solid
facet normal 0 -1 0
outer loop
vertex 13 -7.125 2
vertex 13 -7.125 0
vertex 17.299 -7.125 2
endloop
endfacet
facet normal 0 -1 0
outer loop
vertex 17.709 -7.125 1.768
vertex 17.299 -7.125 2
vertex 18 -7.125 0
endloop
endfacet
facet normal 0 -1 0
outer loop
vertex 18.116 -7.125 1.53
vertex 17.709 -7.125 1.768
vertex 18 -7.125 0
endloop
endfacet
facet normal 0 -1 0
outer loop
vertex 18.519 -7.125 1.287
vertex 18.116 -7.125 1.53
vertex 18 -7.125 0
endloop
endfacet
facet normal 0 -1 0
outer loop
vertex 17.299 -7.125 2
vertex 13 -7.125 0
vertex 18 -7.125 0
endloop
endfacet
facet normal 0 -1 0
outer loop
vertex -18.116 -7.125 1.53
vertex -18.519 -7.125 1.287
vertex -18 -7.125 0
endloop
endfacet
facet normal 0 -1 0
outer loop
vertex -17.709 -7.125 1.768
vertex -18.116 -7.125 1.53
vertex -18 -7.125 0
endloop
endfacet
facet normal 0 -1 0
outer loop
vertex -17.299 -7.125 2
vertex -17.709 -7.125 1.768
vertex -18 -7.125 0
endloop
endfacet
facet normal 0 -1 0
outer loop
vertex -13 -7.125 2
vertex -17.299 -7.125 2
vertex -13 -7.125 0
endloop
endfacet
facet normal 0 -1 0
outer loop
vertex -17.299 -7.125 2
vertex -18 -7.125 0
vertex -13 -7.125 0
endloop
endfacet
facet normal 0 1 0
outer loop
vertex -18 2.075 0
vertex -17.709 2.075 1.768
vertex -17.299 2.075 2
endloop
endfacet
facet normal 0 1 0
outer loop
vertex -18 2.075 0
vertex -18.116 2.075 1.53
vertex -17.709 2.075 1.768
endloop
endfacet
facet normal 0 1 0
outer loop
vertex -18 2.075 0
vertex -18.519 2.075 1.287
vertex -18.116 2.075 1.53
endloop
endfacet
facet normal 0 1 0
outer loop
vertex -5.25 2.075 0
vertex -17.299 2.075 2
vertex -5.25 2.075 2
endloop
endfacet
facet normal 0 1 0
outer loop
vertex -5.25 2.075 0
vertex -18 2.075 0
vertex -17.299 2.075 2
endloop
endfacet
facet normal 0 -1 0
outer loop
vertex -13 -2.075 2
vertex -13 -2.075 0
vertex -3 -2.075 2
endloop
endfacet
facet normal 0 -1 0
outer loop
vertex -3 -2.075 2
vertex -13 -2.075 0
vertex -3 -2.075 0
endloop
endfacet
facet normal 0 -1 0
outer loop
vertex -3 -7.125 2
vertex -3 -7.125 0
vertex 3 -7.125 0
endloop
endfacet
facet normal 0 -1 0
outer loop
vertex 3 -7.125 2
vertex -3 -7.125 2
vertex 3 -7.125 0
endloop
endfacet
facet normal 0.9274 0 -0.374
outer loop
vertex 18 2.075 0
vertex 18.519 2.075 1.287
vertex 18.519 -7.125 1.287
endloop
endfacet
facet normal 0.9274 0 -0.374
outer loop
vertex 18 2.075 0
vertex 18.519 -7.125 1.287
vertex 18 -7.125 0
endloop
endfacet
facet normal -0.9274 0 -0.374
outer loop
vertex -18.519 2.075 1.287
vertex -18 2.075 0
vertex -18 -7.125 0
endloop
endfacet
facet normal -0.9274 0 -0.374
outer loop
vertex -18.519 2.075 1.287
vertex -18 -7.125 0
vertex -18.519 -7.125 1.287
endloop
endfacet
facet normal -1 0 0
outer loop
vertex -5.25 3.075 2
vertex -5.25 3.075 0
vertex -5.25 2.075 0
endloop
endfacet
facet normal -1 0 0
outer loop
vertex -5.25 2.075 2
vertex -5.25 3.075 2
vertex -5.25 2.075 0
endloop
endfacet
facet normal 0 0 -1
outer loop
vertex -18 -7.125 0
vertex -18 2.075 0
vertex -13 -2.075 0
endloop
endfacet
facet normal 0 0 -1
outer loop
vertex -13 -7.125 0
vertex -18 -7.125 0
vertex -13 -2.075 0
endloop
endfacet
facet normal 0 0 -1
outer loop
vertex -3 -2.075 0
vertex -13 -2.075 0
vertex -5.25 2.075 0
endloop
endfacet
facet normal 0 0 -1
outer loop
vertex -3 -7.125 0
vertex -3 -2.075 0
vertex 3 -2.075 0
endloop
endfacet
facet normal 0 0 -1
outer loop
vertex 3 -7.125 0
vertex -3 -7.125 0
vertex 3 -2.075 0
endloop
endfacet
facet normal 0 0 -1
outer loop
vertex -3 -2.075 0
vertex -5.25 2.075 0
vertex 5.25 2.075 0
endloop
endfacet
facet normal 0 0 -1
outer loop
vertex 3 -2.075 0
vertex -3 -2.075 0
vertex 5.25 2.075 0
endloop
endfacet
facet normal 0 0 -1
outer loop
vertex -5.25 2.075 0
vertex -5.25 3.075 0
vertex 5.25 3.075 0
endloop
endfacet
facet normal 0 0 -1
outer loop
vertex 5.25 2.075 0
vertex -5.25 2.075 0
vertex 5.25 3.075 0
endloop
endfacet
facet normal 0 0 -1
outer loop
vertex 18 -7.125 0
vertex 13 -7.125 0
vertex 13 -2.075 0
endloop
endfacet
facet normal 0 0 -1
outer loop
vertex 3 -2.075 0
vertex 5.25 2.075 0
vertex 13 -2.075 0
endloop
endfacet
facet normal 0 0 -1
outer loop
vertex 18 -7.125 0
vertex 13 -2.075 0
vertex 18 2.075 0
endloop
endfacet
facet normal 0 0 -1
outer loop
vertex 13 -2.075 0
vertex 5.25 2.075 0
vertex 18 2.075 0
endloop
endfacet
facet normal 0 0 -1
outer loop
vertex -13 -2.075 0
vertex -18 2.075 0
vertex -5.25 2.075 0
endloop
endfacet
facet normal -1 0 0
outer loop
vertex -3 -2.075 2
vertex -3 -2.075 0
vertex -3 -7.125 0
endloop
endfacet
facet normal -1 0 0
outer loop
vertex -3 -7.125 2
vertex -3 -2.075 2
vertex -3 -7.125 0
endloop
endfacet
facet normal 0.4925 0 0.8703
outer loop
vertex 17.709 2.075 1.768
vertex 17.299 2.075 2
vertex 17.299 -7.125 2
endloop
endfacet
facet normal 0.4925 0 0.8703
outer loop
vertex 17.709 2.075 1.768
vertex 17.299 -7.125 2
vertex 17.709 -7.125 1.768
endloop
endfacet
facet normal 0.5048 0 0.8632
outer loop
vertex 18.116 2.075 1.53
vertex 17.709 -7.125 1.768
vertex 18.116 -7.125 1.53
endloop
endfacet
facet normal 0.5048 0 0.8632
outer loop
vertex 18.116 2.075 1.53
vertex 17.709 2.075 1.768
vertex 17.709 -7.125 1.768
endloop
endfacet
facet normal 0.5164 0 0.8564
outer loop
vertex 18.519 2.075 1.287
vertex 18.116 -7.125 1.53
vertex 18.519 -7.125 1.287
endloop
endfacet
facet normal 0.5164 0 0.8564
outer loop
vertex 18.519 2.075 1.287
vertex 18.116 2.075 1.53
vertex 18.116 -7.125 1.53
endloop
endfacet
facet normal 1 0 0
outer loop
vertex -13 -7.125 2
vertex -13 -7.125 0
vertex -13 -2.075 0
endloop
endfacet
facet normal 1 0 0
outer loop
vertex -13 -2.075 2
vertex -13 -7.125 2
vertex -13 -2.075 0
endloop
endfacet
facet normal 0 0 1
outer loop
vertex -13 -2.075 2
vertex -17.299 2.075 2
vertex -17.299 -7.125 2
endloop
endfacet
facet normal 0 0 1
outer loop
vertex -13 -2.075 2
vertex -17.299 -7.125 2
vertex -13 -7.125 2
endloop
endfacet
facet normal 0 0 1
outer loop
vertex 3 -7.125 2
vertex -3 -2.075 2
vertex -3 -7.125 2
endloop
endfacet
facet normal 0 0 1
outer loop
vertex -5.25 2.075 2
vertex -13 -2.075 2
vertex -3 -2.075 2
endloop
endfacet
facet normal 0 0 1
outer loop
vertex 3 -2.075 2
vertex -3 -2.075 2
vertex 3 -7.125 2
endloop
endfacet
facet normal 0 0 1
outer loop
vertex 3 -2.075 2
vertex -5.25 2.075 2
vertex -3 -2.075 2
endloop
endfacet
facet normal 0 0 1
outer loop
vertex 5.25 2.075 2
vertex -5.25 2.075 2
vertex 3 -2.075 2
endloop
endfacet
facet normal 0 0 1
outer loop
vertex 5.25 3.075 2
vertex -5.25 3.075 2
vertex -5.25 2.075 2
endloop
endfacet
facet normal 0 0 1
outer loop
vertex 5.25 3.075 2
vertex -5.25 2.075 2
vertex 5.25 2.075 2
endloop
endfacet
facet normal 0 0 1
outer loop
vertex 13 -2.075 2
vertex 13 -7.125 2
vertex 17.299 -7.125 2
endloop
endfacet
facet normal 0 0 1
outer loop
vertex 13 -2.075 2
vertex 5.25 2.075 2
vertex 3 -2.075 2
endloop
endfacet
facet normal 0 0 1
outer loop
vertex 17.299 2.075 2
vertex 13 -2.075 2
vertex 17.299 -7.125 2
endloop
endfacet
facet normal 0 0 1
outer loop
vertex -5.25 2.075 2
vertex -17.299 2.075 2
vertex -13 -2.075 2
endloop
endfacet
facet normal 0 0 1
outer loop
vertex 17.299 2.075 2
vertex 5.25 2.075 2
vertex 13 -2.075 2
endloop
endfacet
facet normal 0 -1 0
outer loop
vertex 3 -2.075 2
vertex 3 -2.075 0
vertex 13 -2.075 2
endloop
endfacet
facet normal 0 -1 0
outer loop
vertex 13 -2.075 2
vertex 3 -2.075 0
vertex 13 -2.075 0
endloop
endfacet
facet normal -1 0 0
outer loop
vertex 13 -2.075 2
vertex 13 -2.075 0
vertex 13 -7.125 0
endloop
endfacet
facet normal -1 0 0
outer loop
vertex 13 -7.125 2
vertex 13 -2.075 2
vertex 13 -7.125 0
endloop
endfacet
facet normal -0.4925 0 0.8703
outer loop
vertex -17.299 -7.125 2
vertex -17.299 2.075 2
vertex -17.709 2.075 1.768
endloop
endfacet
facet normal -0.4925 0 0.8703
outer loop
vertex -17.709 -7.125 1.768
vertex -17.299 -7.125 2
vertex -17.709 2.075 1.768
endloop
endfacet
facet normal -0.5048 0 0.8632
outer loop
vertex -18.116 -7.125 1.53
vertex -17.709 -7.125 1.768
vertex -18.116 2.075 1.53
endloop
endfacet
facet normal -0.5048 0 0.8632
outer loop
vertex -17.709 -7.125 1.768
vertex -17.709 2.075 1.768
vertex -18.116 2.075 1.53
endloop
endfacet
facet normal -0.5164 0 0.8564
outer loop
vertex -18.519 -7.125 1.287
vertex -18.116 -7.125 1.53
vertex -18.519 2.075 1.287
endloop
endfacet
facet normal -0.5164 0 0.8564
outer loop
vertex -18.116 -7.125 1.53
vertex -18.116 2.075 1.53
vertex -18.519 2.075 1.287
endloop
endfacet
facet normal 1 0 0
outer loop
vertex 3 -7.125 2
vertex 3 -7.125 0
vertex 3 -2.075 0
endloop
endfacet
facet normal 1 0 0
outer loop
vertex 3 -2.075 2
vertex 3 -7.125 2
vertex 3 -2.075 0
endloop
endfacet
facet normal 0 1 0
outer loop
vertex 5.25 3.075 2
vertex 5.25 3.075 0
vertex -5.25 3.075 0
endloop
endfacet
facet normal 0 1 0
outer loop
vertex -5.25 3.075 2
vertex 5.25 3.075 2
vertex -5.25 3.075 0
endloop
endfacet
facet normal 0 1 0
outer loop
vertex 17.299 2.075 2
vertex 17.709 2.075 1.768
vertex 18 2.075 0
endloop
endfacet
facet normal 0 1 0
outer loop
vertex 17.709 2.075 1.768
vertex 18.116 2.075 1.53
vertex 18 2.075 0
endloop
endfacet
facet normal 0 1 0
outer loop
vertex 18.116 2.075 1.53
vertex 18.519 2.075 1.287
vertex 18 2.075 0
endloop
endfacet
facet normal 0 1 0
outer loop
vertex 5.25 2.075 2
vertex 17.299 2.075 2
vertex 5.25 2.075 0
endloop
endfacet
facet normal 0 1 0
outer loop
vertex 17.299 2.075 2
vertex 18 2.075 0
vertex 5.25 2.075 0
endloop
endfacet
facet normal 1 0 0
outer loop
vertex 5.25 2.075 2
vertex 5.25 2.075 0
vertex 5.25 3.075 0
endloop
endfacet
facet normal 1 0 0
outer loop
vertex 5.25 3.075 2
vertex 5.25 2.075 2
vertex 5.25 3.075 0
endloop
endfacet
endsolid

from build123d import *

# Parameters (mm, degrees)
BOSS_EXTRUDE1_DEPTH = 2
BOSS_EXTRUDE2_DEPTH = 9.2
CUT_EXTRUDE1_REACH  = 23.032


with BuildPart() as part:
    # Sketch1 → Boss-Extrude1 (new body)
    with BuildSketch(Plane.XY):
        Polygon((3, -2.075), (13, -2.075), (13, -7.125), (18, -7.125), (18, -2.075), (18, 2.075), (5.25, 2.075), (5.25, 3.075), (-5.25, 3.075), (-5.25, 2.075), (-18, 2.075), (-18, -2.075), (-18, -7.125), (-13, -7.125), (-13, -2.075), (-3, -2.075), (-3, -7.125), (3, -7.125), align=None)
    extrude(amount=BOSS_EXTRUDE1_DEPTH)

    # Sketch2 → Boss-Extrude2 (add)
    with BuildSketch(Plane(origin=(0, 2.075, 0), x_dir=(1, 0, 0), z_dir=(0, 1, 0))):
        Polygon((-18, 0), (-18.806783424, -2), (-18, -2), align=None)
        Polygon((18, 0), (18, -2), (18.806783424, -2), align=None)
    extrude(amount=-BOSS_EXTRUDE2_DEPTH)

    # Sketch3 → Cut-Extrude1 (cut, up to next)
    with BuildSketch(Plane(origin=(0, 2.075, 0), x_dir=(1, 0, 0), z_dir=(0, 1, 0)), mode=Mode.PRIVATE) as cut_extrude1_sk1:
        with BuildLine():
            Line((-18.519101852, -1.286843127), (-18.806783424, -2))
            Line((-18.806783424, -2), (-17.298843892, -2))
            ThreePointArc((-17.298843892, -2), (-17.912522366, -1.649494979), (-18.519101852, -1.286843127))
        make_face()
    cut_extrude1_tool1 = extrude(cut_extrude1_sk1.sketch, amount=-CUT_EXTRUDE1_REACH, mode=Mode.PRIVATE) & part.part
    # Sketch3 → Cut-Extrude1 (cut, up to next)
    with BuildSketch(Plane(origin=(0, 2.075, 0), x_dir=(1, 0, 0), z_dir=(0, 1, 0)), mode=Mode.PRIVATE) as cut_extrude1_sk2:
        with BuildLine():
            Line((18.806783424, -2), (17.298843892, -2))
            ThreePointArc((17.298843892, -2), (17.912522366, -1.649494979), (18.519101852, -1.286843127))
            Line((18.519101852, -1.286843127), (18.806783424, -2))
        make_face()
    cut_extrude1_tool2 = extrude(cut_extrude1_sk2.sketch, amount=-CUT_EXTRUDE1_REACH, mode=Mode.PRIVATE) & part.part
    add(cut_extrude1_tool1.solids().sort_by_distance((-18.211961, 2.075, 1.763734))[0], mode=Mode.SUBTRACT)
    add(cut_extrude1_tool2.solids().sort_by_distance((18.211961, 2.075, 1.763734))[0], mode=Mode.SUBTRACT)


solid = part.part
